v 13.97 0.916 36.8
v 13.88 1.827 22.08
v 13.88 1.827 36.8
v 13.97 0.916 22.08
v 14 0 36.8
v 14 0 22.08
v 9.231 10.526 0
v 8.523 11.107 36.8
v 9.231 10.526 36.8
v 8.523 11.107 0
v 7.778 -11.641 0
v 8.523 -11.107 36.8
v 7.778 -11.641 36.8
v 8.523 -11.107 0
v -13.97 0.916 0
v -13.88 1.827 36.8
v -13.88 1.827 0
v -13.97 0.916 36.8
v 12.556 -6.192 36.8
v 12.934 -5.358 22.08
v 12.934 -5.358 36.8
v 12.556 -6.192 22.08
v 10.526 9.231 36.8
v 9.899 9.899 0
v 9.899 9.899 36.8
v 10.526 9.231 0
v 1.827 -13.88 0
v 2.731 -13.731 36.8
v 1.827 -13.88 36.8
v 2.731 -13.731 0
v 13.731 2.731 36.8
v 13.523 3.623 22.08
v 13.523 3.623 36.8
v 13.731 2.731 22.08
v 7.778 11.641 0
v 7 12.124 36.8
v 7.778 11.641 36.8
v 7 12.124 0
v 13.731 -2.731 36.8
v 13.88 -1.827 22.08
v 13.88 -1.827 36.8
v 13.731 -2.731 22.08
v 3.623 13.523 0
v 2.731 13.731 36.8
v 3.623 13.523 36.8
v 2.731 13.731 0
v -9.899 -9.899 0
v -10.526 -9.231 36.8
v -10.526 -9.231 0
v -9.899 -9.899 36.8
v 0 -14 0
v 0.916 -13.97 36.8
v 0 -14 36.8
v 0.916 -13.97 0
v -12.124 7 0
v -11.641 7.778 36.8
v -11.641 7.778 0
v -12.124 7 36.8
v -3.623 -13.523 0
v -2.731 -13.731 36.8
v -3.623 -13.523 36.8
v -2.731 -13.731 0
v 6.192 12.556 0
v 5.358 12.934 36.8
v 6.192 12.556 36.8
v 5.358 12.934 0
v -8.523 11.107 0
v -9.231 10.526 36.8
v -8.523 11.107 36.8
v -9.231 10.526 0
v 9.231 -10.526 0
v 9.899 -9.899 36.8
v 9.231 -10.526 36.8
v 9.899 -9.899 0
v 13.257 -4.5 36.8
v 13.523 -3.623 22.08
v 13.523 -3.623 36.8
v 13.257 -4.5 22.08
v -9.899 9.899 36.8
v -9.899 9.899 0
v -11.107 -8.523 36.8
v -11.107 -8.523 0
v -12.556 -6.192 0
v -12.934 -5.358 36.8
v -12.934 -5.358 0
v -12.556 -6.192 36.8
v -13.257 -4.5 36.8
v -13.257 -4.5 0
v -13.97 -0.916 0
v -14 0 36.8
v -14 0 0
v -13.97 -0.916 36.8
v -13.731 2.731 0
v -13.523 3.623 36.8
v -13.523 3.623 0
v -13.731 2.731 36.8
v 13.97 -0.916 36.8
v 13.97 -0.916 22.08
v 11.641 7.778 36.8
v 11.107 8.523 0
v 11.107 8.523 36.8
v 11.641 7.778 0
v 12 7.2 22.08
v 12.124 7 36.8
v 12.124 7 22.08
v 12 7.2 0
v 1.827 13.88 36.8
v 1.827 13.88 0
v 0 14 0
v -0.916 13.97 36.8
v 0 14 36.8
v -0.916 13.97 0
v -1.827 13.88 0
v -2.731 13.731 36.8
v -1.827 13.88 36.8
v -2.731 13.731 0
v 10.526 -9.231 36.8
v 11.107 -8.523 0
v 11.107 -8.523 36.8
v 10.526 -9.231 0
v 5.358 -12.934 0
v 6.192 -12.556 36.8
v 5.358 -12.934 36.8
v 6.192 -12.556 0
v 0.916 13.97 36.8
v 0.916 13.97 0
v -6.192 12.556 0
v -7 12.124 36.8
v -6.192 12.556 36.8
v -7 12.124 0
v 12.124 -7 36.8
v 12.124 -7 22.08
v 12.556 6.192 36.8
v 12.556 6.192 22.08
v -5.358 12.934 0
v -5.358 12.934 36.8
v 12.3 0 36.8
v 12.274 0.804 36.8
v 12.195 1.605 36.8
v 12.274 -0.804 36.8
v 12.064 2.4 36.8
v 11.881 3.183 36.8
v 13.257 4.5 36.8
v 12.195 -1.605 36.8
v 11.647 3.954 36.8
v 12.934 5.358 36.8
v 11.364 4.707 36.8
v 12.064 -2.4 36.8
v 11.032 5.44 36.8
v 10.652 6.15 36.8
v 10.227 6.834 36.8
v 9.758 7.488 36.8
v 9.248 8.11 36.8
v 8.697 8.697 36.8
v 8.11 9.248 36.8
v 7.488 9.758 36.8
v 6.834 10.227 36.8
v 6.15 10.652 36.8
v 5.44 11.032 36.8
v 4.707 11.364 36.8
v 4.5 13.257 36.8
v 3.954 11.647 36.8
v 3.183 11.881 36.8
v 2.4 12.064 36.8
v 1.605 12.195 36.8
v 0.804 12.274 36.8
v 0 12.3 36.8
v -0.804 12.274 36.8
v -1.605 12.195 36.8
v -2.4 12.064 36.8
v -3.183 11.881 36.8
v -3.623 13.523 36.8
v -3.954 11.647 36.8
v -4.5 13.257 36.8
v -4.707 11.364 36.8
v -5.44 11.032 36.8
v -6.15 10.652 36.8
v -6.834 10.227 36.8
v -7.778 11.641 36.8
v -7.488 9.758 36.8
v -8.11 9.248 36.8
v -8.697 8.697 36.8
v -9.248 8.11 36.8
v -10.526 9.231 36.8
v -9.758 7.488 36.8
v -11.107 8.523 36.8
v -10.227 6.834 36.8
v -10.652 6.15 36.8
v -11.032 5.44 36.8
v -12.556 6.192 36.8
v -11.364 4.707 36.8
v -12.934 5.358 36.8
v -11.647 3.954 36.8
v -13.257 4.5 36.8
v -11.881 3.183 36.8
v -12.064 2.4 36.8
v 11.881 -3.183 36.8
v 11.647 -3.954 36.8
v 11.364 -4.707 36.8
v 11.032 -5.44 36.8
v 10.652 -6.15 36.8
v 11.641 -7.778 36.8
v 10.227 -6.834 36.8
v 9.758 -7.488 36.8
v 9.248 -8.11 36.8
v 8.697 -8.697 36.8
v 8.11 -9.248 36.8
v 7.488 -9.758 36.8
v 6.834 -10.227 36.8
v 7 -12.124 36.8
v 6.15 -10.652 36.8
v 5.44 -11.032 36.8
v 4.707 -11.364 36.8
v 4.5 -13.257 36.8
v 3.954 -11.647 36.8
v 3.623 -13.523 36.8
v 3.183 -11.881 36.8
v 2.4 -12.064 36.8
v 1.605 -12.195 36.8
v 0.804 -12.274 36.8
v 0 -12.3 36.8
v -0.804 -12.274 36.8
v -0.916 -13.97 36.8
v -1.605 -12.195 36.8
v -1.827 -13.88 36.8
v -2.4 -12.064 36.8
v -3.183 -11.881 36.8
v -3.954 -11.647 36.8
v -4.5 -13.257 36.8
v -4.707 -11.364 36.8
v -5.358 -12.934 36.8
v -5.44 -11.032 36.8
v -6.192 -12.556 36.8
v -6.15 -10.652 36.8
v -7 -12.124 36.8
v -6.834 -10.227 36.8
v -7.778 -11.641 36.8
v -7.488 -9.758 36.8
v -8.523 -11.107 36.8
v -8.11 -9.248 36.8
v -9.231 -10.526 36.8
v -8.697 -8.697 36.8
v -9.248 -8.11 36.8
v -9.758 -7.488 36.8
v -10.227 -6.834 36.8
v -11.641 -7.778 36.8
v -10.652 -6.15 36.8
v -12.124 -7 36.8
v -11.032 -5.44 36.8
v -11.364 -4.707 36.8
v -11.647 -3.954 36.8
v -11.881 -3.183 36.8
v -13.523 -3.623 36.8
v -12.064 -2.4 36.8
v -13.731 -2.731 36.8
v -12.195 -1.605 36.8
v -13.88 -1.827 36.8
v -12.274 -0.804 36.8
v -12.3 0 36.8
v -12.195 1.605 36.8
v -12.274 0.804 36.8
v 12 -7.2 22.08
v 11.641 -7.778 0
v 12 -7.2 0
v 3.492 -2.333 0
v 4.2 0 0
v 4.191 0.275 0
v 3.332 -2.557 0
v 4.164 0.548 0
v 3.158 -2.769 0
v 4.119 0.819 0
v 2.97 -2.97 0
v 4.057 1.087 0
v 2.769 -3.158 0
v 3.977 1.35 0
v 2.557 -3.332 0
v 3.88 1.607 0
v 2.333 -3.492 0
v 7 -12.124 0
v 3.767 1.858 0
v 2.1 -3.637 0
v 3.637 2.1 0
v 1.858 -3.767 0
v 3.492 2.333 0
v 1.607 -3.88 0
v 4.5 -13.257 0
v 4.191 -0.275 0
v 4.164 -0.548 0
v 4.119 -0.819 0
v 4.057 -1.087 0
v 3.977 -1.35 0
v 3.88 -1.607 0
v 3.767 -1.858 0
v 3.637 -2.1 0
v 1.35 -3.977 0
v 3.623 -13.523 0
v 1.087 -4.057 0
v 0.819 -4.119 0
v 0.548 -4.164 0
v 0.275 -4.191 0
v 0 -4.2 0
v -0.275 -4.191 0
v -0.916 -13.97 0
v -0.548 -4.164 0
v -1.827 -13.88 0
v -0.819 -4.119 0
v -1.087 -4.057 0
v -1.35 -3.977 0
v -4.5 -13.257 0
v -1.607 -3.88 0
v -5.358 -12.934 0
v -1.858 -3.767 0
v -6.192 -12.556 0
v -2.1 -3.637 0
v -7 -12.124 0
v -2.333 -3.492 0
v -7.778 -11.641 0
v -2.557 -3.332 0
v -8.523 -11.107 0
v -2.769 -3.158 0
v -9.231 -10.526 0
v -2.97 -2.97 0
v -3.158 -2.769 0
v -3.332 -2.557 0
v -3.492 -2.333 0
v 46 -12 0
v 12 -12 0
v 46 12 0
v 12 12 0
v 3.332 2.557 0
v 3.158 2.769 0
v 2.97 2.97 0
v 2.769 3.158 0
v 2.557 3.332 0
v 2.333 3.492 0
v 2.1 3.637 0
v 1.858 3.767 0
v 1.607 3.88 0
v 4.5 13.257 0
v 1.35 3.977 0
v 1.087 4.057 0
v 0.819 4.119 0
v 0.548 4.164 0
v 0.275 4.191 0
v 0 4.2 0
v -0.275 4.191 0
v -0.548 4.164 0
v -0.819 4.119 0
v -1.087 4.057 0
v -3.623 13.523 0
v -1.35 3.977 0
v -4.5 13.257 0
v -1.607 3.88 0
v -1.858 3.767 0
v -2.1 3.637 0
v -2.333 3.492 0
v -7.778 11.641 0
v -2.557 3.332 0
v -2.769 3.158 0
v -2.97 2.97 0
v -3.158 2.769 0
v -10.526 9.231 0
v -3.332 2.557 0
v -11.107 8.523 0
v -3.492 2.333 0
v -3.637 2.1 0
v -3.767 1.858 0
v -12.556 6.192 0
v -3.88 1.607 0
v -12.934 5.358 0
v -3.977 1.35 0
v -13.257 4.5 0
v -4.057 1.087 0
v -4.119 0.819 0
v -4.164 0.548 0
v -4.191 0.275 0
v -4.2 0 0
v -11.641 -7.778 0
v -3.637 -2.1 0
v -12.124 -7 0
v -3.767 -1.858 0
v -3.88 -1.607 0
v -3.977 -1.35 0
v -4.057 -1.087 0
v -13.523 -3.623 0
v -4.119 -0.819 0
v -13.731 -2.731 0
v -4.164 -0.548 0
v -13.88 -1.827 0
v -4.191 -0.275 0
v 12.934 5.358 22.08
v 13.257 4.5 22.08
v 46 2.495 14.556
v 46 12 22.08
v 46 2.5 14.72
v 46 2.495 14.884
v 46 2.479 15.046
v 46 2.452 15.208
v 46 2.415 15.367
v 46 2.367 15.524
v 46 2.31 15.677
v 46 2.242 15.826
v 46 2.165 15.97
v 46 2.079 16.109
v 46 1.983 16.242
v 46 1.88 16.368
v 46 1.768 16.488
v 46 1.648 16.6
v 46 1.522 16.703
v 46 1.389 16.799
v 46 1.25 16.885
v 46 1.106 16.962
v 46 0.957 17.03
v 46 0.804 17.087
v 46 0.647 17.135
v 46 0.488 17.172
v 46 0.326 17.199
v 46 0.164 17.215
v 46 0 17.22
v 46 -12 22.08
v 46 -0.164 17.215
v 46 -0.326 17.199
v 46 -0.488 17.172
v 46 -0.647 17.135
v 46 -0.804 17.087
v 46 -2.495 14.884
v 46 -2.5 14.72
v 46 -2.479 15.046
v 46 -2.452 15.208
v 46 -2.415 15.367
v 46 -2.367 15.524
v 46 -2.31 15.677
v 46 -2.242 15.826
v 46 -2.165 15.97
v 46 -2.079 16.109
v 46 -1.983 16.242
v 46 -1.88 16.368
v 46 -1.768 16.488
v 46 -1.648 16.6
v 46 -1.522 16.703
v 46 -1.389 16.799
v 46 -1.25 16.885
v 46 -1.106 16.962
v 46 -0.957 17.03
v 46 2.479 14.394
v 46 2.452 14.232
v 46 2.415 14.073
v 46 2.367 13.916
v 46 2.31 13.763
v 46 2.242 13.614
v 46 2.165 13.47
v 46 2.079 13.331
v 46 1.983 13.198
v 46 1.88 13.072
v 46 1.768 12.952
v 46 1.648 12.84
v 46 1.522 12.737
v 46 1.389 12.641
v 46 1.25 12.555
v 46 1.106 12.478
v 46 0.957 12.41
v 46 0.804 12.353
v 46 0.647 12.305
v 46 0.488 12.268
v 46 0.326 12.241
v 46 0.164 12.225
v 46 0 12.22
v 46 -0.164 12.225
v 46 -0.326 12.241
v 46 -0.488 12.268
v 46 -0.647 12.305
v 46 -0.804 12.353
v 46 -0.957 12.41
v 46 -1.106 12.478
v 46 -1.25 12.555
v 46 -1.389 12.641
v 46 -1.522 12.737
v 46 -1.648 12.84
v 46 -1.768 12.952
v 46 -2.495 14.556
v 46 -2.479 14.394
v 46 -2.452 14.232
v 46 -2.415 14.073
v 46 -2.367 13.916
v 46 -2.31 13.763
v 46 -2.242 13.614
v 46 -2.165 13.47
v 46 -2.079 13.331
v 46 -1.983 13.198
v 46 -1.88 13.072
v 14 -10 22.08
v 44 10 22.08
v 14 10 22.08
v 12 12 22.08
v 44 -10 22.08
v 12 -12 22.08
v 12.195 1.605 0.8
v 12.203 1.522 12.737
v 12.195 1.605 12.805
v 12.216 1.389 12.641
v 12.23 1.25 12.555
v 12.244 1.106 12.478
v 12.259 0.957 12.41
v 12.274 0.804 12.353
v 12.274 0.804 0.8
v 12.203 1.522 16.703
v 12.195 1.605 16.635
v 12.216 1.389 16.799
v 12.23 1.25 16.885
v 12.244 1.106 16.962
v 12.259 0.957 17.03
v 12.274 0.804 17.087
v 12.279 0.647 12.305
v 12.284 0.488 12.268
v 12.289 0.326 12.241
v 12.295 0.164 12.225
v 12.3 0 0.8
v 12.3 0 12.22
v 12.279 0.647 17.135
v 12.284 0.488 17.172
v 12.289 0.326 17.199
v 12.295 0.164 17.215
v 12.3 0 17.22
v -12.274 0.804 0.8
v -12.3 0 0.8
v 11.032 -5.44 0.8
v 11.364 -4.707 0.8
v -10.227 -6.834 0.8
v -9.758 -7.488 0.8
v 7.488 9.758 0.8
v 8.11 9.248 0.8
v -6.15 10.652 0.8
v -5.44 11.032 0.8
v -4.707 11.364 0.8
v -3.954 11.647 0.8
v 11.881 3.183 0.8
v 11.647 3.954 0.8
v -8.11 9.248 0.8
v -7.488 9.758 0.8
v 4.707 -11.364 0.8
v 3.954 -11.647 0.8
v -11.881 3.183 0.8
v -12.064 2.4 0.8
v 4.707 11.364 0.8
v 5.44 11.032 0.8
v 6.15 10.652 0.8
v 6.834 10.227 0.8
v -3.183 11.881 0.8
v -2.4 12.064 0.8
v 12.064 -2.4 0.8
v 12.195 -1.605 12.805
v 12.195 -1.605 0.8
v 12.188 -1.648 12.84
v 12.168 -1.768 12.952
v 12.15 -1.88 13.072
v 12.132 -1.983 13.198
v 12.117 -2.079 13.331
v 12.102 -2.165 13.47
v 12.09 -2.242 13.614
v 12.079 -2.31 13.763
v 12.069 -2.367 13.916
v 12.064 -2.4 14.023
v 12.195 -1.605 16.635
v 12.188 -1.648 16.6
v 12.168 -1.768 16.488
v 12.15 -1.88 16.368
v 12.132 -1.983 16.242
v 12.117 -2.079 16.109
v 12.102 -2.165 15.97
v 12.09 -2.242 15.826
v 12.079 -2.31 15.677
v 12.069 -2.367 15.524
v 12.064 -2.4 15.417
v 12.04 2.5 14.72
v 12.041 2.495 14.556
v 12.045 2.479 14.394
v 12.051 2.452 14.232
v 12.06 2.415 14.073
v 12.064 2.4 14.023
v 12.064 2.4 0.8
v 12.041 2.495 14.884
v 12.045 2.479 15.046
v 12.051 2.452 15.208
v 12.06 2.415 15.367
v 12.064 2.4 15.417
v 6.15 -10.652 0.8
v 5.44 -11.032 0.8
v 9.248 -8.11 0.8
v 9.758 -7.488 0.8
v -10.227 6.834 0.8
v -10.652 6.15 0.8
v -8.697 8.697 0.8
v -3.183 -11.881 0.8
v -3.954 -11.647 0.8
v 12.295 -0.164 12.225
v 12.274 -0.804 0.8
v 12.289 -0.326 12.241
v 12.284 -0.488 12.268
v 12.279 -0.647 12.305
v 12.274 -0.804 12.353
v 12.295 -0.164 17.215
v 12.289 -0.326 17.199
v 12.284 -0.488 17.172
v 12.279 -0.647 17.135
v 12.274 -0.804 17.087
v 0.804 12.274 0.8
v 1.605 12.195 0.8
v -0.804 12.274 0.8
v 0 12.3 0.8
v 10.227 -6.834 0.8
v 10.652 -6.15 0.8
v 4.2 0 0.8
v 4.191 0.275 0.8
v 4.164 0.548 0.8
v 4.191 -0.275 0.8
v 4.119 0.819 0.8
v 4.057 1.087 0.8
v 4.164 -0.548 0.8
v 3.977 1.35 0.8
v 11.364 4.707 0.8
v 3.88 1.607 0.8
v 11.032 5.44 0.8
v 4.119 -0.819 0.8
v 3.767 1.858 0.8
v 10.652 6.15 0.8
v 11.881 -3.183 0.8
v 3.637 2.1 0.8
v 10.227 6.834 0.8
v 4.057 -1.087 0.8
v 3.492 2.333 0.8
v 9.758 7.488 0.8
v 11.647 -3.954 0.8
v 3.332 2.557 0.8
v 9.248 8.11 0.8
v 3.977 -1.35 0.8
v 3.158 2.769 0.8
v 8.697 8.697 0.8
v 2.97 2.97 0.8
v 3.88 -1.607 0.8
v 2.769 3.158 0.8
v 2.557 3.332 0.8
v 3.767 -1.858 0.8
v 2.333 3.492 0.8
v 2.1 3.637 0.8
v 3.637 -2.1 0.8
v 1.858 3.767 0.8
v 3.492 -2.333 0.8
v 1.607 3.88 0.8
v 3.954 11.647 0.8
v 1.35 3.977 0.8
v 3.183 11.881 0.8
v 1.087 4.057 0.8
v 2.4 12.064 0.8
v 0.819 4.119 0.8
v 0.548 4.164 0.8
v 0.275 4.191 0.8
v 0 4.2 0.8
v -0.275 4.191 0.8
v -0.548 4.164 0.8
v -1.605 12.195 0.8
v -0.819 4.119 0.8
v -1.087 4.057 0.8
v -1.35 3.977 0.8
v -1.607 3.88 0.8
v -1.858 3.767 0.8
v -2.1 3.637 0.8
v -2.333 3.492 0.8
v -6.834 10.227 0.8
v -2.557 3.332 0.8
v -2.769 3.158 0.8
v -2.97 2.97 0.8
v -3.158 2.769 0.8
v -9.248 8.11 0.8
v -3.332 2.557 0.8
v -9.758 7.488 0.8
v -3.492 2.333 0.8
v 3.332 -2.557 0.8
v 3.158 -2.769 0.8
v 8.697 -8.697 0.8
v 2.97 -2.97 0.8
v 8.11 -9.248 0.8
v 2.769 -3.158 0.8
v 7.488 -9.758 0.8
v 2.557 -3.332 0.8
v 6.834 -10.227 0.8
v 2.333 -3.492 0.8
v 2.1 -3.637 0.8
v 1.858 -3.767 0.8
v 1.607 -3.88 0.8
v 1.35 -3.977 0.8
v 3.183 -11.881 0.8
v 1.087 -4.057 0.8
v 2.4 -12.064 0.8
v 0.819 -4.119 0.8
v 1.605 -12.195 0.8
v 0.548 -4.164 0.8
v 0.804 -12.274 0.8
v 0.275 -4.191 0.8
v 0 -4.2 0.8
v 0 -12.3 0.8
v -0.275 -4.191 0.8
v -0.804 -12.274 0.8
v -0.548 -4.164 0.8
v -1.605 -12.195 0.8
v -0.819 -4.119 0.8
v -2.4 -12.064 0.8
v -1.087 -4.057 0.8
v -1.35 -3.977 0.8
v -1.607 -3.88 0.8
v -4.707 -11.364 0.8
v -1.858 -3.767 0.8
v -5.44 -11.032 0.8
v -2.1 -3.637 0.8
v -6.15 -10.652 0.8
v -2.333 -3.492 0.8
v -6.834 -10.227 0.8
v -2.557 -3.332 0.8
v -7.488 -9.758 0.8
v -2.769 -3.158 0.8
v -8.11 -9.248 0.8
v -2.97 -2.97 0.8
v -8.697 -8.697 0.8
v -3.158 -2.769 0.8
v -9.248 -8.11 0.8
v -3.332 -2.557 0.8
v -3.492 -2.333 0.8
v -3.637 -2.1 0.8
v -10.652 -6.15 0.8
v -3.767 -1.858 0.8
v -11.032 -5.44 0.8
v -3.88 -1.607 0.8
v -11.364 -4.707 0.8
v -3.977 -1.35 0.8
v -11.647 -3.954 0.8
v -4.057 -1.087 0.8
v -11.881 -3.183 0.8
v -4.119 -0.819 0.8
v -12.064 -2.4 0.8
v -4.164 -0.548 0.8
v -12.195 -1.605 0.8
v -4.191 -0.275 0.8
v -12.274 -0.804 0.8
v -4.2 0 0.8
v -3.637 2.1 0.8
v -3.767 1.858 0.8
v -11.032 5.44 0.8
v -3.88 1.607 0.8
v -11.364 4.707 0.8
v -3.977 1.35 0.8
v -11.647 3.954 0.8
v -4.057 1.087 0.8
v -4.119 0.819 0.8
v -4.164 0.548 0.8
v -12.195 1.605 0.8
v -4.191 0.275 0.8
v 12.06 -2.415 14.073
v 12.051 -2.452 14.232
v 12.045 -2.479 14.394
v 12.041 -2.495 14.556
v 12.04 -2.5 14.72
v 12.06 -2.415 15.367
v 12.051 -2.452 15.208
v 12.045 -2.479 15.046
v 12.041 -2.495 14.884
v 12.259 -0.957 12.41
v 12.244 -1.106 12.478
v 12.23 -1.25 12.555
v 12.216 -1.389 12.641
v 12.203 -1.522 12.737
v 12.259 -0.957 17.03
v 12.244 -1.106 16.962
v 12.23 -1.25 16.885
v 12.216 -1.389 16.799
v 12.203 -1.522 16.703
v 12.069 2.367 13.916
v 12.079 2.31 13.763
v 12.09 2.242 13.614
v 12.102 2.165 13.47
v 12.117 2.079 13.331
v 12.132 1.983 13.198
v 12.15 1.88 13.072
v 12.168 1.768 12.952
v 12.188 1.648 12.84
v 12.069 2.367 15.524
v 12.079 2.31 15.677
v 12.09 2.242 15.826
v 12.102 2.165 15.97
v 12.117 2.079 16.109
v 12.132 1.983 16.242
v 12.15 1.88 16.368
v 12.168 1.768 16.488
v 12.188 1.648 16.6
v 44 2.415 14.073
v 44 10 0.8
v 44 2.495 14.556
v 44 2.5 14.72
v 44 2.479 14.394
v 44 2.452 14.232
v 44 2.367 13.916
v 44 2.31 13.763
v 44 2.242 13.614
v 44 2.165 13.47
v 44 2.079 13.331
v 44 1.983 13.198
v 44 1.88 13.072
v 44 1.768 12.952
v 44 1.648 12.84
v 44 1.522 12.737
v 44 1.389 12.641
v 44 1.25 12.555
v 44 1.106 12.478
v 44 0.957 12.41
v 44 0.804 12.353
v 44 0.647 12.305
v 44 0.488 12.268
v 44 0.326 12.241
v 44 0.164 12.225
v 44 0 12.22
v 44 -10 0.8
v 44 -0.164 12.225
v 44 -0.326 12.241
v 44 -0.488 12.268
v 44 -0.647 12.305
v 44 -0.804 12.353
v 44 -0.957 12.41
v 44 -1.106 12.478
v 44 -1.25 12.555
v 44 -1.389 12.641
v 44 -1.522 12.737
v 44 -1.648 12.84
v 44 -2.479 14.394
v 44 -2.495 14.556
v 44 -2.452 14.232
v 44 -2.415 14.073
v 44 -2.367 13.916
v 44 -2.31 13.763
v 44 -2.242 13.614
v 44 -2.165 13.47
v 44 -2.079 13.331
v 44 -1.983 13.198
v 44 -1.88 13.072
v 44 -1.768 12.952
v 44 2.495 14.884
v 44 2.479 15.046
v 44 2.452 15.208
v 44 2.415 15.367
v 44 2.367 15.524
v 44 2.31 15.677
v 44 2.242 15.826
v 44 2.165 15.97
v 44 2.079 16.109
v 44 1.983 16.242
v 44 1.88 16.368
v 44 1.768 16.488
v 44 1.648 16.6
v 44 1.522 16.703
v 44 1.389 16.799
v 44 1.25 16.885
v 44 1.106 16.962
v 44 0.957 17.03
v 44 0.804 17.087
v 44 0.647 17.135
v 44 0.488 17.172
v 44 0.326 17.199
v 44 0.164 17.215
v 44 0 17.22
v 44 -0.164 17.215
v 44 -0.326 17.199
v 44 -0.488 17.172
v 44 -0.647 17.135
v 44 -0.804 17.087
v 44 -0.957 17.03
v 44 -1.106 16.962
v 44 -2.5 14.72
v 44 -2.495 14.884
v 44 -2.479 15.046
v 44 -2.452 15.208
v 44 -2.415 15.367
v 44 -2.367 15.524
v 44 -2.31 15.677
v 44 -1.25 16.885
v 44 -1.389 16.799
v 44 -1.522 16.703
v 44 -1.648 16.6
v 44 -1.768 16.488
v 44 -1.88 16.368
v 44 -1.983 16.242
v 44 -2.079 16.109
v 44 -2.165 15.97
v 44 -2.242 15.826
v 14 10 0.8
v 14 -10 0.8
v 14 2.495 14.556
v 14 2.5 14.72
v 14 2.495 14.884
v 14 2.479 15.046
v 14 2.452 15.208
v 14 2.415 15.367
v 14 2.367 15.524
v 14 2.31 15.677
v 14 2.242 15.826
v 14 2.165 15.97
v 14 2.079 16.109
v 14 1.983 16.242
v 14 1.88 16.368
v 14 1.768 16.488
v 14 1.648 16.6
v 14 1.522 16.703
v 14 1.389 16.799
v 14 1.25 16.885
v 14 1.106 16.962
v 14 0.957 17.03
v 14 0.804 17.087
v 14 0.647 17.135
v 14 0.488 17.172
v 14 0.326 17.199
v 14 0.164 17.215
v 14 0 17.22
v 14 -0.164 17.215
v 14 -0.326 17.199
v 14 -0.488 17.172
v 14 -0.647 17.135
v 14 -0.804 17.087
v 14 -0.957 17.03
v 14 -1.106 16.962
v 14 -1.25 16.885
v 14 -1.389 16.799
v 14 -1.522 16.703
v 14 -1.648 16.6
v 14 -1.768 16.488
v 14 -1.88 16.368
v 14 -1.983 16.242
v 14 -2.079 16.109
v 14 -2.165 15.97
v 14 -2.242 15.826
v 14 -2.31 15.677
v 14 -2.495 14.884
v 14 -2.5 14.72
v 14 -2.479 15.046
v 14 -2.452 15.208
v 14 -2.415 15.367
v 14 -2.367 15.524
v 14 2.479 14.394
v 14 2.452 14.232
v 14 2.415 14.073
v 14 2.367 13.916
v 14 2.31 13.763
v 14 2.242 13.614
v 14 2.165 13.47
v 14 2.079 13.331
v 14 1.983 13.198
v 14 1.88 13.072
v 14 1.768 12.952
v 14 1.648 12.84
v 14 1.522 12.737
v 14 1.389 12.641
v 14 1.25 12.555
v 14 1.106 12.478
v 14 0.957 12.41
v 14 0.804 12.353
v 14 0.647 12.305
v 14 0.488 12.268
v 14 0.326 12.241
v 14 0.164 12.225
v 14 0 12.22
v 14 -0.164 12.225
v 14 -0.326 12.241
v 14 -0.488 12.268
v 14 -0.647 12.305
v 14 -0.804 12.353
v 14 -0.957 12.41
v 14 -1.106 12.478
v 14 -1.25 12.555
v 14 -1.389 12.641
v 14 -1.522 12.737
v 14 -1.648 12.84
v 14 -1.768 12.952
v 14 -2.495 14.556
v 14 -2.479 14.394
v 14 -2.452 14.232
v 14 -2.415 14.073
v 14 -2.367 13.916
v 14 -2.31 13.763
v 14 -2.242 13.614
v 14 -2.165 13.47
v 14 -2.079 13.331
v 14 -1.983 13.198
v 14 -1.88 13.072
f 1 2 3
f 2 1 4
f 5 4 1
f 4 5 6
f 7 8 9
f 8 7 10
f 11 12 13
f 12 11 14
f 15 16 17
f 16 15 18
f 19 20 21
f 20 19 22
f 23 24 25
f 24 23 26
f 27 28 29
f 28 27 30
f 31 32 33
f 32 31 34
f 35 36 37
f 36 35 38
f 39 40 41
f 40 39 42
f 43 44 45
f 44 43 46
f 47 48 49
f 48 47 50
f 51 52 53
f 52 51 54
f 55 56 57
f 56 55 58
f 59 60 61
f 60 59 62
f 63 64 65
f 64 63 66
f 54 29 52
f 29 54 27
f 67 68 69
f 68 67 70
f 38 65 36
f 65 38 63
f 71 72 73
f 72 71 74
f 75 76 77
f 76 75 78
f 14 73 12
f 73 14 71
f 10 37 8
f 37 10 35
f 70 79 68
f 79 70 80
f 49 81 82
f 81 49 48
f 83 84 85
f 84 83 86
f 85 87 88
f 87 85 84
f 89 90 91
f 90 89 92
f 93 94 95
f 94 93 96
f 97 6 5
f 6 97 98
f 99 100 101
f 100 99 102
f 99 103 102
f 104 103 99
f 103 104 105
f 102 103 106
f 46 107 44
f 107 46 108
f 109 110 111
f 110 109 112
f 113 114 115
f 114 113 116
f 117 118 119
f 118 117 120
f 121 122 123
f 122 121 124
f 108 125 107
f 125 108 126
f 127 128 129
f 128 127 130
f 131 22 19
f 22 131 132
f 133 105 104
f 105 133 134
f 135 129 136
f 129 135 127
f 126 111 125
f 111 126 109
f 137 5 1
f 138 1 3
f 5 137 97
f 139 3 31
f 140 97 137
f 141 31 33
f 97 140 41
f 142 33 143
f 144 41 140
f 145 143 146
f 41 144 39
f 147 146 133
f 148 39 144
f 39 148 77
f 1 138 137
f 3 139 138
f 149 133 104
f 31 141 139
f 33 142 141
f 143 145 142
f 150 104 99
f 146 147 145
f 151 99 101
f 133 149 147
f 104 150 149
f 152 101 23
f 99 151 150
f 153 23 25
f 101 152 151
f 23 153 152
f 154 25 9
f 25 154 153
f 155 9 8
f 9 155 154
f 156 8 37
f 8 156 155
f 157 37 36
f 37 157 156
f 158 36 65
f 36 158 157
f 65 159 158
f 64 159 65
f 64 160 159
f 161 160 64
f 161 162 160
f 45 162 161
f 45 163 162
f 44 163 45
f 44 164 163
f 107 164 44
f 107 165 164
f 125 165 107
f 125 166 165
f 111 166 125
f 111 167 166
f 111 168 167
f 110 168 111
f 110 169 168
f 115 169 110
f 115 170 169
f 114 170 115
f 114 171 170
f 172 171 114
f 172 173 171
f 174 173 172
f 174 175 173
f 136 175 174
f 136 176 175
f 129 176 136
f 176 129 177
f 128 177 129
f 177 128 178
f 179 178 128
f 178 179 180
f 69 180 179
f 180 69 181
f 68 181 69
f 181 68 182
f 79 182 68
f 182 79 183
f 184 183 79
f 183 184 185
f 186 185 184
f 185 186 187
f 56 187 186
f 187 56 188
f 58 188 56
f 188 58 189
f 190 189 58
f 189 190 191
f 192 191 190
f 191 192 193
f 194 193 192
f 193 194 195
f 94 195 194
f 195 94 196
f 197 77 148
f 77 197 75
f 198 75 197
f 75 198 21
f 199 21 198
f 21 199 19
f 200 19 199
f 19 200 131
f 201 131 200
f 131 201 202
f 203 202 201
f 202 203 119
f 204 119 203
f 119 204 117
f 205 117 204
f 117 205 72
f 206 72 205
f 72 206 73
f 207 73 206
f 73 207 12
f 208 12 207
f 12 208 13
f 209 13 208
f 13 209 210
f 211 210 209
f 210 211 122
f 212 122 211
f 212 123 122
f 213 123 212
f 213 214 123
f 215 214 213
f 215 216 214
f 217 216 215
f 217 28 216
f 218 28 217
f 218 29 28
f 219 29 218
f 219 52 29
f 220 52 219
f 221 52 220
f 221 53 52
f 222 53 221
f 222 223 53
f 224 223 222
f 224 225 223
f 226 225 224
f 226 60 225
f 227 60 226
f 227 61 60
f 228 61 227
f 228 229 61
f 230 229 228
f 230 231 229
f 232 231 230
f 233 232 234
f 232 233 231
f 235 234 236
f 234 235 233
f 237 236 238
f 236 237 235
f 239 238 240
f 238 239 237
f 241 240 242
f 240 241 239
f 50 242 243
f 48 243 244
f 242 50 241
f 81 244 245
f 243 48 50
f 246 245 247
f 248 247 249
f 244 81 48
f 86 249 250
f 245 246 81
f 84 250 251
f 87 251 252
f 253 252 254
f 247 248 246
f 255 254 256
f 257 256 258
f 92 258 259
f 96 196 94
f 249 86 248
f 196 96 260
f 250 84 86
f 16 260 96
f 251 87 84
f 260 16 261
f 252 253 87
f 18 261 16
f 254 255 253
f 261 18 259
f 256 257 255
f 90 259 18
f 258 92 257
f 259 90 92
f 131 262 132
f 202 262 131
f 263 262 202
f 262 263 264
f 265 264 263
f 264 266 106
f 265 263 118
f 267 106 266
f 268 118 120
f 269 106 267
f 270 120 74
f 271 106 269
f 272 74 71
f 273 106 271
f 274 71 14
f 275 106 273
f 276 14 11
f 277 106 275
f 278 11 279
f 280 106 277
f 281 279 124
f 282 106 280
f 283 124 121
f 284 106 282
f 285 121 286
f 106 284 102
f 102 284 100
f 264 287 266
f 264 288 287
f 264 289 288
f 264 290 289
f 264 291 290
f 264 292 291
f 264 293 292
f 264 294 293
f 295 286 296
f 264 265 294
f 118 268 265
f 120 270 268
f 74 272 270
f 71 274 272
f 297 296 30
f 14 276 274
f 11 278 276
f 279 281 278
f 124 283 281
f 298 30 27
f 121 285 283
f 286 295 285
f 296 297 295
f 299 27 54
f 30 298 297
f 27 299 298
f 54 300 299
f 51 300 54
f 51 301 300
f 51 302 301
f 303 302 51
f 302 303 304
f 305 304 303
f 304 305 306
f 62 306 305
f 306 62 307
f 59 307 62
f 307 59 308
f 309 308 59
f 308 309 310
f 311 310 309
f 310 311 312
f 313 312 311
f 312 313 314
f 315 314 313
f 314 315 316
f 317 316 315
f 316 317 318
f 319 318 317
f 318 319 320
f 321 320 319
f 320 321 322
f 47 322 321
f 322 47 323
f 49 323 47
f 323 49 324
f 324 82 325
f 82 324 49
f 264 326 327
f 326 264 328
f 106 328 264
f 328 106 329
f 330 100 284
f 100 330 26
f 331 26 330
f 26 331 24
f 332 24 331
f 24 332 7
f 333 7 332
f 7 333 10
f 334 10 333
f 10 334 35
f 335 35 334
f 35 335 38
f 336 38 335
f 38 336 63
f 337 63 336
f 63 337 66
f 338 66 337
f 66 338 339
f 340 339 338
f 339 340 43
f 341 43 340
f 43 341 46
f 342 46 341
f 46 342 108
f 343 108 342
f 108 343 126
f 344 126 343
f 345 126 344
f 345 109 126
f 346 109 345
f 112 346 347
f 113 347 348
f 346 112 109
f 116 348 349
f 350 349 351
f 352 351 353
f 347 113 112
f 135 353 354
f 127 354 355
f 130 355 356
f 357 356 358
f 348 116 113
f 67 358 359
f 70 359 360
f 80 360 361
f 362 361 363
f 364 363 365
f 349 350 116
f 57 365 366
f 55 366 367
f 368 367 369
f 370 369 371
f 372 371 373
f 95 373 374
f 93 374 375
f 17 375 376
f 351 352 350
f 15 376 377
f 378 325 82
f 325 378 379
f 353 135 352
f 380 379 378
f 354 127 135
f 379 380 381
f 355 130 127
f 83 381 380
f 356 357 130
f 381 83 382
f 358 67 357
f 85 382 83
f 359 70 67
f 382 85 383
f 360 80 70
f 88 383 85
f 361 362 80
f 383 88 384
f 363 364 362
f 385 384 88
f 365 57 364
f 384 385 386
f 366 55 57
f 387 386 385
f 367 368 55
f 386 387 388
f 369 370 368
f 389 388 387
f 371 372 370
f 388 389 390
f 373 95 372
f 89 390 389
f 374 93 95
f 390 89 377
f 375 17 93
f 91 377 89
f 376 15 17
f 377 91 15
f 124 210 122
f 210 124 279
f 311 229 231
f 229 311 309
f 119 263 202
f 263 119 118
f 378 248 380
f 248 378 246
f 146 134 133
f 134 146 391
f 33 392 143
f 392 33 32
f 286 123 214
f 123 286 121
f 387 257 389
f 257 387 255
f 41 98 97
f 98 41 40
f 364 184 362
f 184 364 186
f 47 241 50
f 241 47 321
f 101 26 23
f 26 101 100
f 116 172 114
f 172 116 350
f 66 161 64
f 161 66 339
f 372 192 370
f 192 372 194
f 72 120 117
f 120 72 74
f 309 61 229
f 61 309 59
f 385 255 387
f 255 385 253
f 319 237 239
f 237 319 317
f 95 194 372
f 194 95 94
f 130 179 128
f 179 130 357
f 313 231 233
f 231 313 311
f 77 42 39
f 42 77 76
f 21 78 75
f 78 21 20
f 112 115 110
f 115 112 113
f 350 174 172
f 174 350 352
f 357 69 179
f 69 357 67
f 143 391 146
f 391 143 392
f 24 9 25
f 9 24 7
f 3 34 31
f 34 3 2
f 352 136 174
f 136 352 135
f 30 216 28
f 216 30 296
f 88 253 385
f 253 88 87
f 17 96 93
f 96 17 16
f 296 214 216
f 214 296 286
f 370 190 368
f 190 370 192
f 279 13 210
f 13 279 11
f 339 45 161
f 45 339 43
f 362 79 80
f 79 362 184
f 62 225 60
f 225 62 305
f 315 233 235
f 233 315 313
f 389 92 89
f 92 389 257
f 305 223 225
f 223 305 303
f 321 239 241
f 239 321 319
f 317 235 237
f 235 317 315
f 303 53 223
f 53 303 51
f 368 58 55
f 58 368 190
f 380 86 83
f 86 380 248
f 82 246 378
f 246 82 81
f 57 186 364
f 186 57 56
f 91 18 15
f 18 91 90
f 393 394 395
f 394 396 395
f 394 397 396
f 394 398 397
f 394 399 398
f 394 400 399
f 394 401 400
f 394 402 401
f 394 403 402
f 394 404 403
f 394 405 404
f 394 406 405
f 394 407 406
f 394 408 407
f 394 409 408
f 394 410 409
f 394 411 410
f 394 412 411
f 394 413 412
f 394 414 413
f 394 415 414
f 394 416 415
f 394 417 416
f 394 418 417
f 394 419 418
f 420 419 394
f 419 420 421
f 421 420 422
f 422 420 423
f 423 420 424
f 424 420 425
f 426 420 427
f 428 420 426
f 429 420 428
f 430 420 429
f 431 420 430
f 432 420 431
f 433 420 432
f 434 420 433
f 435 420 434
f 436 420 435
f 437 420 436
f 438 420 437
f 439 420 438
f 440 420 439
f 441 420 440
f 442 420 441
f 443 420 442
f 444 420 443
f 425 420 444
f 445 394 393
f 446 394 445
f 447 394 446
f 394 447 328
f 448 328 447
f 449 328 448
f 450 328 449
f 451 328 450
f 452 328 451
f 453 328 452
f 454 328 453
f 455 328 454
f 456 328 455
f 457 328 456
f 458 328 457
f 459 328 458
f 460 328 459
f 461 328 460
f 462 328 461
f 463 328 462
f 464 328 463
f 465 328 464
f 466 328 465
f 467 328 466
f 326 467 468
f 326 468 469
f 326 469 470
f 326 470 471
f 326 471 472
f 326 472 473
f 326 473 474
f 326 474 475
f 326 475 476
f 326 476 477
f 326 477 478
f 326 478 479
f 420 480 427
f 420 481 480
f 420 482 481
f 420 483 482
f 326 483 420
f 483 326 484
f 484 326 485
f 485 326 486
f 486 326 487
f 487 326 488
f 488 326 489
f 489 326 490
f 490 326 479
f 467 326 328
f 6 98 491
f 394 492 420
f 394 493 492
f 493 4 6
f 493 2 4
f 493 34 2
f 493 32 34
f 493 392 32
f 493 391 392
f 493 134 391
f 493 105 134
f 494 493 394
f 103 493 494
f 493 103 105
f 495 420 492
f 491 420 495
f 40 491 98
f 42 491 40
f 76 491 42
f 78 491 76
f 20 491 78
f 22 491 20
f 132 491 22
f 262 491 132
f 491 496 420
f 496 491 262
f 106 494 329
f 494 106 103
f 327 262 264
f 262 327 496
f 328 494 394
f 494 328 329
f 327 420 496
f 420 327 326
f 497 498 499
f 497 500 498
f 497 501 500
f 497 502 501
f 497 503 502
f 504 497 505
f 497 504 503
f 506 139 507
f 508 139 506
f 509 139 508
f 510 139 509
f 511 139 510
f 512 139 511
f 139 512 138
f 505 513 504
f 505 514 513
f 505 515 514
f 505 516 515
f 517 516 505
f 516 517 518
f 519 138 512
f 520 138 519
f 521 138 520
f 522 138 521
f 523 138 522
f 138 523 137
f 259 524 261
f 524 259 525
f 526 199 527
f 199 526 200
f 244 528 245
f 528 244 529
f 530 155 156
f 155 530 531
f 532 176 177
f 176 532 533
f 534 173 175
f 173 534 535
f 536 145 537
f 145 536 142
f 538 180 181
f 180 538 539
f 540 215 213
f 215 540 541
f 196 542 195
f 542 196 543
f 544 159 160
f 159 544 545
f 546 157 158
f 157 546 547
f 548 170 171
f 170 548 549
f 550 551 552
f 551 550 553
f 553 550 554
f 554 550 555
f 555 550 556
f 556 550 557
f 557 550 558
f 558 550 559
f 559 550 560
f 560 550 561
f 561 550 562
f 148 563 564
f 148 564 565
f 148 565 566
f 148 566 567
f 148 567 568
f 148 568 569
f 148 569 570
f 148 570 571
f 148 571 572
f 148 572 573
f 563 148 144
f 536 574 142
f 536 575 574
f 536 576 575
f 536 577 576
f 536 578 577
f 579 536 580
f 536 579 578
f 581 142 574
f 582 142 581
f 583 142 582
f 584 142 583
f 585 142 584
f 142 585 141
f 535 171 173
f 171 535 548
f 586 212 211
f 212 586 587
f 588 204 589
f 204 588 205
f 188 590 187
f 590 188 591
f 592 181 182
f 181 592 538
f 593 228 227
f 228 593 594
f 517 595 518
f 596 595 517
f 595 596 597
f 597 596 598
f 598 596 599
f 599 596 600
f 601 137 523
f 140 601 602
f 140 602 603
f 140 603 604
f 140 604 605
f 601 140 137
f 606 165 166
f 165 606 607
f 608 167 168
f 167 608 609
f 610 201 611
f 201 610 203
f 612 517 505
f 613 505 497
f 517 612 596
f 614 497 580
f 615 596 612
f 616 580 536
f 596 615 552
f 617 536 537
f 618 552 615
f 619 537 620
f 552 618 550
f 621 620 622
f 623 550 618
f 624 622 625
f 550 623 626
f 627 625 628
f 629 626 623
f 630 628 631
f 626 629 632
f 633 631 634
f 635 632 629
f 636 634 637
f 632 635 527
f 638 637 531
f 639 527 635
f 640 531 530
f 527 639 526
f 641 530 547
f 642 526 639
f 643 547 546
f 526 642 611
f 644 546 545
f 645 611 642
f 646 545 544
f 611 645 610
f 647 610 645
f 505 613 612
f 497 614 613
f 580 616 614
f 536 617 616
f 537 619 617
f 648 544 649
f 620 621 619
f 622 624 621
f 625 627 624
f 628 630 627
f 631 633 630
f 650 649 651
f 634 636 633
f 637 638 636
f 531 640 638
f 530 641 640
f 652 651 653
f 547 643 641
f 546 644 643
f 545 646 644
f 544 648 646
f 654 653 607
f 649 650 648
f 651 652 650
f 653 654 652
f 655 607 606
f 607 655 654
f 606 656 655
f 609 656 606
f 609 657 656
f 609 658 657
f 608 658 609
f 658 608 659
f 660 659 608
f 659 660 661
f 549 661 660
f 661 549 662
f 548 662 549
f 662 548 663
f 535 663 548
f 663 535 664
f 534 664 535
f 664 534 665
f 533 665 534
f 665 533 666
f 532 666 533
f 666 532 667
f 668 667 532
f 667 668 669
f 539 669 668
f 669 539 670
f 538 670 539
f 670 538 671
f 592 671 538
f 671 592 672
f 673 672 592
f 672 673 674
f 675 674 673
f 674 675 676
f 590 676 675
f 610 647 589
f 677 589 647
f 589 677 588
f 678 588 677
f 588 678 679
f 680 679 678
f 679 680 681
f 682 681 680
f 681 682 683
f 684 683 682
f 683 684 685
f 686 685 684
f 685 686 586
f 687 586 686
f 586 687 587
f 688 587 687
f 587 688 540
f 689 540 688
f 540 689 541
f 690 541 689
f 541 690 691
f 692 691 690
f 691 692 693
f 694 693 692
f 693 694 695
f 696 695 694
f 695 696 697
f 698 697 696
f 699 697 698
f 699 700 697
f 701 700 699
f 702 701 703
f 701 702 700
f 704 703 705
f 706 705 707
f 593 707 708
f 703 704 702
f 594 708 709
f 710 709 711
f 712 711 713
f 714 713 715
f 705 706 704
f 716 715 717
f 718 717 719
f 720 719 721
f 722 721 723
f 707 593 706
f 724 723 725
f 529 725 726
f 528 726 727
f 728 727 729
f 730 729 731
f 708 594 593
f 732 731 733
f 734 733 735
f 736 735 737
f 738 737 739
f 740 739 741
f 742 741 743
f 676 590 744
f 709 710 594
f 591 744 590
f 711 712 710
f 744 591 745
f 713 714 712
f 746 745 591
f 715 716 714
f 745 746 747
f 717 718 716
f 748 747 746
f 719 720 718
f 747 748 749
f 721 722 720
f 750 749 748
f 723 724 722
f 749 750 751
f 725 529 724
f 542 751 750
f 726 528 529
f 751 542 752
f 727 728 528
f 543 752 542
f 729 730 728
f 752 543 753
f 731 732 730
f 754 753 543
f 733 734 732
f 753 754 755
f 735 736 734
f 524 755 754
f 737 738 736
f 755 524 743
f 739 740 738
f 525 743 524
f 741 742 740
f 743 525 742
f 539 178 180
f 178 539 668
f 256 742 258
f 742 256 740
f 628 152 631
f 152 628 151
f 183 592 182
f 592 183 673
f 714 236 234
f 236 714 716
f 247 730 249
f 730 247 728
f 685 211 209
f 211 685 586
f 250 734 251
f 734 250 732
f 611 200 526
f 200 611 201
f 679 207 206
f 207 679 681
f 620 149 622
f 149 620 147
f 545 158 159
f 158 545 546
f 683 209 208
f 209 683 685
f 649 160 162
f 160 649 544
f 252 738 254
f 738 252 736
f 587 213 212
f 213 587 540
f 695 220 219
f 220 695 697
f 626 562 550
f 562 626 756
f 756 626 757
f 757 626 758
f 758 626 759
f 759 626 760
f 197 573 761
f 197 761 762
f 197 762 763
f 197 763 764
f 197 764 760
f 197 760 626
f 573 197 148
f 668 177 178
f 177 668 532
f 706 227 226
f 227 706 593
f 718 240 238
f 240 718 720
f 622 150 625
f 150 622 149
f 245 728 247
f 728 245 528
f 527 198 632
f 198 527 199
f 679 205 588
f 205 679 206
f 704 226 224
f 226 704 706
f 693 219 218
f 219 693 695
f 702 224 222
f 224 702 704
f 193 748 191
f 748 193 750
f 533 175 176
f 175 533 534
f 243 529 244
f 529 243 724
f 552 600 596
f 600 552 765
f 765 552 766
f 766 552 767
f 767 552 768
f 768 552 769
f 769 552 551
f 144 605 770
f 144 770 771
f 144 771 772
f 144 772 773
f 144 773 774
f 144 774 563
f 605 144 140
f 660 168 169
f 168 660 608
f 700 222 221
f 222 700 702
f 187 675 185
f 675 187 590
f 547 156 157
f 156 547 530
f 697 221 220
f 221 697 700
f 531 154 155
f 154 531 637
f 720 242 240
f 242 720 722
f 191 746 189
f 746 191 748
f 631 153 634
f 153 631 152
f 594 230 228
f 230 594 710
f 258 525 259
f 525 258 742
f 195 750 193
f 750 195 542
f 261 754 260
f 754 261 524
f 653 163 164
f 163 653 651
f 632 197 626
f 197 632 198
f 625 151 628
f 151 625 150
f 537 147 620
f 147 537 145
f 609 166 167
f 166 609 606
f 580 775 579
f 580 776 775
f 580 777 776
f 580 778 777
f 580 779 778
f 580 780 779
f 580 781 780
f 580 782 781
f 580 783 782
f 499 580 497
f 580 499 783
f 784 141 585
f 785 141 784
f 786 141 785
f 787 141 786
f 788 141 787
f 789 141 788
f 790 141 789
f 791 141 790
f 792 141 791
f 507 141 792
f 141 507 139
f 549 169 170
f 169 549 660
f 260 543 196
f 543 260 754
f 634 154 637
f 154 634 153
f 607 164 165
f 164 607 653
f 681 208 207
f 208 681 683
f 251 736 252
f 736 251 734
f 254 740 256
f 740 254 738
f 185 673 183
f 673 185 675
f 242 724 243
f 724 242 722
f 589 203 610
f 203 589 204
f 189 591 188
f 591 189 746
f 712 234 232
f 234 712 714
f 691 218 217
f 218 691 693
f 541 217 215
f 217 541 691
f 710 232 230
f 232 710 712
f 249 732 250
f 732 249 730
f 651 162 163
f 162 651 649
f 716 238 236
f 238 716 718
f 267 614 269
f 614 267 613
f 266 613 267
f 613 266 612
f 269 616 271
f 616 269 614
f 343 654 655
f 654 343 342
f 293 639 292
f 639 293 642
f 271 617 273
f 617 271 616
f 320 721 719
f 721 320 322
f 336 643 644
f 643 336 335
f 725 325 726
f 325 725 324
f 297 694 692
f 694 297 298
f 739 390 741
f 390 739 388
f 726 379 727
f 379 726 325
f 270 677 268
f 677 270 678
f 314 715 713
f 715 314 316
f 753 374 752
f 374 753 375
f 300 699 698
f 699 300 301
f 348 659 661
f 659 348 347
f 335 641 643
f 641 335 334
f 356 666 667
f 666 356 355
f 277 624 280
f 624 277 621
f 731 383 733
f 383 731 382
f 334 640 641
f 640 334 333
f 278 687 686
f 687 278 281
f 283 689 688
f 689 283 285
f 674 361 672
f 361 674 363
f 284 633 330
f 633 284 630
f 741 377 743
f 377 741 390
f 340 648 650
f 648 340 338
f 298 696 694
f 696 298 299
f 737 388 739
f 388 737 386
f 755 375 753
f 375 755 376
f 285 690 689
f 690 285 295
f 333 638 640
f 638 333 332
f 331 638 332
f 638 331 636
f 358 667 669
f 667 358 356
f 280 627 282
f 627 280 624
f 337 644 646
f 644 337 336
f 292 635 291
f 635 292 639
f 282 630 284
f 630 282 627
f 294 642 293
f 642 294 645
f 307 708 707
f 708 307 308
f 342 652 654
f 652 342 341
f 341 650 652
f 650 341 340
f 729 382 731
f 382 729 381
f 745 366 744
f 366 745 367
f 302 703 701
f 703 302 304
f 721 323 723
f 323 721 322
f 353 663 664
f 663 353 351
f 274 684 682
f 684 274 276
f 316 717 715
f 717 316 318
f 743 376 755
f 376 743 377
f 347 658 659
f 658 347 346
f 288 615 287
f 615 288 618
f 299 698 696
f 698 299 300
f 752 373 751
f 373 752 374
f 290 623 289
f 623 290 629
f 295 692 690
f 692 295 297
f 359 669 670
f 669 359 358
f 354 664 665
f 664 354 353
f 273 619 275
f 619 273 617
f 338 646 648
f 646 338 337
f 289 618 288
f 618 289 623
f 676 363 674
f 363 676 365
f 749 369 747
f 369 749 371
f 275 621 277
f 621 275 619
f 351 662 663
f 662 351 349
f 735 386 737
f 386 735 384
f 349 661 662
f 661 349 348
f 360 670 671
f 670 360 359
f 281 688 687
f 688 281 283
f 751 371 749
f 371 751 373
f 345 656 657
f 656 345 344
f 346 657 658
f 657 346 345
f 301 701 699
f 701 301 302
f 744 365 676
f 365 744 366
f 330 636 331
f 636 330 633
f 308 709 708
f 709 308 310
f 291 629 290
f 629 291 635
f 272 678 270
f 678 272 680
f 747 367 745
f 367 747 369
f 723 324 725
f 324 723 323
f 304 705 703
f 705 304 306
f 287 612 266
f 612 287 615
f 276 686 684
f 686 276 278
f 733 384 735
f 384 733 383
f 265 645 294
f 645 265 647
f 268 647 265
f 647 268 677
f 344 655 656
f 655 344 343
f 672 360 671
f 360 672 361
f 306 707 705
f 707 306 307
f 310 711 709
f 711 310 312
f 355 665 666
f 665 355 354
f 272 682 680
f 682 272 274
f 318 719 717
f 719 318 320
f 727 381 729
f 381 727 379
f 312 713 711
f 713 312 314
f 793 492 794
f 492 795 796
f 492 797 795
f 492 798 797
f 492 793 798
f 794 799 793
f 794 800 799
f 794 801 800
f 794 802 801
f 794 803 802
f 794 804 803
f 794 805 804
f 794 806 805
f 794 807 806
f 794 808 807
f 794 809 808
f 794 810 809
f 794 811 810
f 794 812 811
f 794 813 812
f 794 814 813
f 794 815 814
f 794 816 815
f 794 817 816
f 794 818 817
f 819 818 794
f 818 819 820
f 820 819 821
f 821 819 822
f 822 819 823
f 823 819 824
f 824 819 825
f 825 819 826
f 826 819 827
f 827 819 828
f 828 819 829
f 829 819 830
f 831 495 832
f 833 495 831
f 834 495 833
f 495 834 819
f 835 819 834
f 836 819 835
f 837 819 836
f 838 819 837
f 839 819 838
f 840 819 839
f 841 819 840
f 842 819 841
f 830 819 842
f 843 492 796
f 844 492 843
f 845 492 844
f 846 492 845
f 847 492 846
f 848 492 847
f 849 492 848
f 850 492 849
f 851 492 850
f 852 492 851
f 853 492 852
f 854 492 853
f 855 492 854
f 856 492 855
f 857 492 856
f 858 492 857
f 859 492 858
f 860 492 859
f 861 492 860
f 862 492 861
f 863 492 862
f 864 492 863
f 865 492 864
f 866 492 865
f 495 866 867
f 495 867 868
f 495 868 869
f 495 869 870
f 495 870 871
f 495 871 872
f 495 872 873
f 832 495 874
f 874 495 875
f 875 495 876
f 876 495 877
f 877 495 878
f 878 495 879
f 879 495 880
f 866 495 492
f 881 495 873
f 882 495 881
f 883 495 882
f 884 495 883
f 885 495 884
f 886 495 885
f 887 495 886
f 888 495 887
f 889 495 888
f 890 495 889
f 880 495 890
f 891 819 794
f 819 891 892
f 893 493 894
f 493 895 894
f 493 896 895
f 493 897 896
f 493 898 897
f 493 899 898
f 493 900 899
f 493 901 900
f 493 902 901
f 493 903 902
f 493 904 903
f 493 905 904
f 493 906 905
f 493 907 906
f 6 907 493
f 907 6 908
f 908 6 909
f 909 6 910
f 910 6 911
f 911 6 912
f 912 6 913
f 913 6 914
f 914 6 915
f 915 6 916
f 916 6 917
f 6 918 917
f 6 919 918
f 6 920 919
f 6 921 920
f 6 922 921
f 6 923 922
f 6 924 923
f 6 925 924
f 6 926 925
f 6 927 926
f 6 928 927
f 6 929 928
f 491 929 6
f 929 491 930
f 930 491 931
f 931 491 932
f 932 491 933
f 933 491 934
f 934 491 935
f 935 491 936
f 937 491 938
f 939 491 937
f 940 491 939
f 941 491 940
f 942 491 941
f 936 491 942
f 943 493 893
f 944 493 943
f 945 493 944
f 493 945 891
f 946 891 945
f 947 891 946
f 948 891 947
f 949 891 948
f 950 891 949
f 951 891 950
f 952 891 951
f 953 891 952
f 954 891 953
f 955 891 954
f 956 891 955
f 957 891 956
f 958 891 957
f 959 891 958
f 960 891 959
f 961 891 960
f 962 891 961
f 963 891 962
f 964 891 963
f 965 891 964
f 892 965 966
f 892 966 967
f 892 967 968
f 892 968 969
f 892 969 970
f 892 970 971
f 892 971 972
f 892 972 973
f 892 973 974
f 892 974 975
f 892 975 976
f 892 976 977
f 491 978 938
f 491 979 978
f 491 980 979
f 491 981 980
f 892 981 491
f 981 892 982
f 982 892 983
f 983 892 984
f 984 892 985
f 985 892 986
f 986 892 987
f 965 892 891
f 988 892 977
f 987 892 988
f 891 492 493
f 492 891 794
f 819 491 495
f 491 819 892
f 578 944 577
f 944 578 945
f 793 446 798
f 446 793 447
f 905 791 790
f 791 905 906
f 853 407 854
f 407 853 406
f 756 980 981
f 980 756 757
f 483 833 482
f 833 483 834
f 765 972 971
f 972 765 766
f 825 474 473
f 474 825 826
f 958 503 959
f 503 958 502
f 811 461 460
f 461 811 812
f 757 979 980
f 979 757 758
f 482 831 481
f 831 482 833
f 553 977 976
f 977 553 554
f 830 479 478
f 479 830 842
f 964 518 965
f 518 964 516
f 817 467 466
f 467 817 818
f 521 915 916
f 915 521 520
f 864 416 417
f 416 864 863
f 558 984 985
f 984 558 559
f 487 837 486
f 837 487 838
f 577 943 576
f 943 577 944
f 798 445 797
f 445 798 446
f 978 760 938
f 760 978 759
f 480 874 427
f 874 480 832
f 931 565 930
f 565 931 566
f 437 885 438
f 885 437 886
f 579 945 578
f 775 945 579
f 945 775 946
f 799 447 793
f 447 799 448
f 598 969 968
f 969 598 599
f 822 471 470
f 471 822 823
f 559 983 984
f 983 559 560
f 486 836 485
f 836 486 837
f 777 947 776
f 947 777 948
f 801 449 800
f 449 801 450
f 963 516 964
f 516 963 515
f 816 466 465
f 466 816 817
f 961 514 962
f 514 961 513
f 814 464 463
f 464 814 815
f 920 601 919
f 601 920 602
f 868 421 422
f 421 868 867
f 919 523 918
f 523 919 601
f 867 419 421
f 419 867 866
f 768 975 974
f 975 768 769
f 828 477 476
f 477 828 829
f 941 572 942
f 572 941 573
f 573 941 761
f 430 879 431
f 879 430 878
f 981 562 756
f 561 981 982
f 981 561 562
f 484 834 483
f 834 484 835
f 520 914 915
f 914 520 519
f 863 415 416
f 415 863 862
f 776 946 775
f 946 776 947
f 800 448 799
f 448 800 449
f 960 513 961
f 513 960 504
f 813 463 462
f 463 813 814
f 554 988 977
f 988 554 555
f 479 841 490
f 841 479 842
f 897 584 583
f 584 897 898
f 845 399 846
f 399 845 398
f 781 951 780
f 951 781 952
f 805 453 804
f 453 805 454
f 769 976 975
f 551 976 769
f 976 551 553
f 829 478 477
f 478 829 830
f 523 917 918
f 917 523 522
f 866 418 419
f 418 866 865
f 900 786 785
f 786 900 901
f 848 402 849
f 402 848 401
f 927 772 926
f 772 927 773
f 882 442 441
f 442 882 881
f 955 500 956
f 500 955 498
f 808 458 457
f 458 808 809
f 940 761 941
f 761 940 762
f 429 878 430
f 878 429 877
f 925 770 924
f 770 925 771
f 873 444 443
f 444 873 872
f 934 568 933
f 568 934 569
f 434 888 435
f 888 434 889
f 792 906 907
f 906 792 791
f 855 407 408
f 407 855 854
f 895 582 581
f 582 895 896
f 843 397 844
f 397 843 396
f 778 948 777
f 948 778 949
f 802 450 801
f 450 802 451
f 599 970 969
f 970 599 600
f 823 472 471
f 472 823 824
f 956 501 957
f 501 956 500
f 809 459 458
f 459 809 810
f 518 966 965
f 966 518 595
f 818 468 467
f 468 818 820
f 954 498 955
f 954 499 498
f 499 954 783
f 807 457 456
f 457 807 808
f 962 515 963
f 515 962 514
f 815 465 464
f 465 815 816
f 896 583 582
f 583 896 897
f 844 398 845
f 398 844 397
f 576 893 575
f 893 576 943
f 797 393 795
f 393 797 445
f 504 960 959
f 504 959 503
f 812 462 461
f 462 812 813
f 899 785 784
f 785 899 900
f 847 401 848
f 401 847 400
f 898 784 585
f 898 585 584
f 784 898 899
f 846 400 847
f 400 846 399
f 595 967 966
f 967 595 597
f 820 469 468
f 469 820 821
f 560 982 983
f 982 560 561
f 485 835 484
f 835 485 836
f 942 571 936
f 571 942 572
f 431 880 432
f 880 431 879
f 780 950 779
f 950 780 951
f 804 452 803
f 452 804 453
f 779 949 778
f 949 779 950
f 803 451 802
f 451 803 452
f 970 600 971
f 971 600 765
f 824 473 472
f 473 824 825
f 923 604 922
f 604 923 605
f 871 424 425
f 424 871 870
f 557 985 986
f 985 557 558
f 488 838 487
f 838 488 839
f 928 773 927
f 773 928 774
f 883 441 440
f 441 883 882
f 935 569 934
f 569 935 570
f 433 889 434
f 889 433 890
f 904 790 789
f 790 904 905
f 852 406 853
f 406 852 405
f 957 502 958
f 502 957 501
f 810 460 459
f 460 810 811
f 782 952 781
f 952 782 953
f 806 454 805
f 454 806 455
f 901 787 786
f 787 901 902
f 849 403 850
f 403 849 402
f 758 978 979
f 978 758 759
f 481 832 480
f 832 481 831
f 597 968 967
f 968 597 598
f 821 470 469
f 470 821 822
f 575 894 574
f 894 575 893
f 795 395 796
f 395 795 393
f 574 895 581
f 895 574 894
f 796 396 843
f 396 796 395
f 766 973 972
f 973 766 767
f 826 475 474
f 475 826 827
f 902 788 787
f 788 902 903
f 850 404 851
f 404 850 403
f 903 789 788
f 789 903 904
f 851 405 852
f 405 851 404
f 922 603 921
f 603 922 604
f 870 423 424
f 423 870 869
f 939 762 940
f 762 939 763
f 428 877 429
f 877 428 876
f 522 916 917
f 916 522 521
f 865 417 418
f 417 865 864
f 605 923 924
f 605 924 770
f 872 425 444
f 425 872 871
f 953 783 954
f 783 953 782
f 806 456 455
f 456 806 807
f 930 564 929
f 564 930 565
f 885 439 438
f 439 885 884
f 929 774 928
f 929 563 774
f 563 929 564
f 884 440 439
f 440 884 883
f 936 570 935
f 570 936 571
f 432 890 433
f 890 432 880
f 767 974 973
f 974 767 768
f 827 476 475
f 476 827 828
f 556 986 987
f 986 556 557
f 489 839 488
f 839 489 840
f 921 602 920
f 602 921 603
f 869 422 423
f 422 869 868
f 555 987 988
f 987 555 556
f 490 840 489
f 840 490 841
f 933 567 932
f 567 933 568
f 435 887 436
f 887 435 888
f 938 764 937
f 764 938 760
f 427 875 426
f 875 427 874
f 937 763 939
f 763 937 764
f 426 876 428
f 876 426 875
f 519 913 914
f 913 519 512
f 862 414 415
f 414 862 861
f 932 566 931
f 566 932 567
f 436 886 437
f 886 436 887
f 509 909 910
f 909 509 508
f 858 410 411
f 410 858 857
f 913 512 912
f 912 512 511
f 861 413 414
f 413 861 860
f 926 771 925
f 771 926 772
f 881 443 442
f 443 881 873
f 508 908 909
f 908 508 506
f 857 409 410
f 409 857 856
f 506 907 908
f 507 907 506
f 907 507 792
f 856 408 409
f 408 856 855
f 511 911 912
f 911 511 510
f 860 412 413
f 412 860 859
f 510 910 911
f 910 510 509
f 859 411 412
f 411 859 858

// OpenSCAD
// FerrumFS TX pod: holds the coil vertically with its core flush to the
// bottom face, so the field goes straight down through the table.

core_d    = 8.4;   // M8 iron bolt / ferrite rod + clearance
coil_od   = 24;    // wound coil outer diameter
coil_h    = 32;    // winding length
floor_t   = 0.8;   // thin floor: every mm costs field strength (~1/r^3)
wall      = 2;
pcb_w     = 20;    // MOSFET + flyback diode perfboard
pcb_l     = 30;
cable_d   = 5;
$fn = 96;

od = coil_od + 2 * wall;
h  = coil_h + floor_t + 4;

difference() {
    union() {
        cylinder(d = od, h = h);
        translate([od / 2 - wall, -pcb_w / 2 - wall, 0])
            cube([pcb_l + 2 * wall, pcb_w + 2 * wall, h * 0.6]);   // driver bay
    }
    translate([0, 0, floor_t]) cylinder(d = coil_od + 0.6, h = h);  // coil
    translate([0, 0, -1]) cylinder(d = core_d, h = h + 2);           // core pokes through
    translate([od / 2, -pcb_w / 2, floor_t])
        cube([pcb_l, pcb_w, h]);                                     // pcb pocket
    translate([0, 0, h * 0.4]) rotate([0, 90, 0])
        cylinder(d = cable_d, h = od + pcb_l + 10);                  // leads + cable
}
